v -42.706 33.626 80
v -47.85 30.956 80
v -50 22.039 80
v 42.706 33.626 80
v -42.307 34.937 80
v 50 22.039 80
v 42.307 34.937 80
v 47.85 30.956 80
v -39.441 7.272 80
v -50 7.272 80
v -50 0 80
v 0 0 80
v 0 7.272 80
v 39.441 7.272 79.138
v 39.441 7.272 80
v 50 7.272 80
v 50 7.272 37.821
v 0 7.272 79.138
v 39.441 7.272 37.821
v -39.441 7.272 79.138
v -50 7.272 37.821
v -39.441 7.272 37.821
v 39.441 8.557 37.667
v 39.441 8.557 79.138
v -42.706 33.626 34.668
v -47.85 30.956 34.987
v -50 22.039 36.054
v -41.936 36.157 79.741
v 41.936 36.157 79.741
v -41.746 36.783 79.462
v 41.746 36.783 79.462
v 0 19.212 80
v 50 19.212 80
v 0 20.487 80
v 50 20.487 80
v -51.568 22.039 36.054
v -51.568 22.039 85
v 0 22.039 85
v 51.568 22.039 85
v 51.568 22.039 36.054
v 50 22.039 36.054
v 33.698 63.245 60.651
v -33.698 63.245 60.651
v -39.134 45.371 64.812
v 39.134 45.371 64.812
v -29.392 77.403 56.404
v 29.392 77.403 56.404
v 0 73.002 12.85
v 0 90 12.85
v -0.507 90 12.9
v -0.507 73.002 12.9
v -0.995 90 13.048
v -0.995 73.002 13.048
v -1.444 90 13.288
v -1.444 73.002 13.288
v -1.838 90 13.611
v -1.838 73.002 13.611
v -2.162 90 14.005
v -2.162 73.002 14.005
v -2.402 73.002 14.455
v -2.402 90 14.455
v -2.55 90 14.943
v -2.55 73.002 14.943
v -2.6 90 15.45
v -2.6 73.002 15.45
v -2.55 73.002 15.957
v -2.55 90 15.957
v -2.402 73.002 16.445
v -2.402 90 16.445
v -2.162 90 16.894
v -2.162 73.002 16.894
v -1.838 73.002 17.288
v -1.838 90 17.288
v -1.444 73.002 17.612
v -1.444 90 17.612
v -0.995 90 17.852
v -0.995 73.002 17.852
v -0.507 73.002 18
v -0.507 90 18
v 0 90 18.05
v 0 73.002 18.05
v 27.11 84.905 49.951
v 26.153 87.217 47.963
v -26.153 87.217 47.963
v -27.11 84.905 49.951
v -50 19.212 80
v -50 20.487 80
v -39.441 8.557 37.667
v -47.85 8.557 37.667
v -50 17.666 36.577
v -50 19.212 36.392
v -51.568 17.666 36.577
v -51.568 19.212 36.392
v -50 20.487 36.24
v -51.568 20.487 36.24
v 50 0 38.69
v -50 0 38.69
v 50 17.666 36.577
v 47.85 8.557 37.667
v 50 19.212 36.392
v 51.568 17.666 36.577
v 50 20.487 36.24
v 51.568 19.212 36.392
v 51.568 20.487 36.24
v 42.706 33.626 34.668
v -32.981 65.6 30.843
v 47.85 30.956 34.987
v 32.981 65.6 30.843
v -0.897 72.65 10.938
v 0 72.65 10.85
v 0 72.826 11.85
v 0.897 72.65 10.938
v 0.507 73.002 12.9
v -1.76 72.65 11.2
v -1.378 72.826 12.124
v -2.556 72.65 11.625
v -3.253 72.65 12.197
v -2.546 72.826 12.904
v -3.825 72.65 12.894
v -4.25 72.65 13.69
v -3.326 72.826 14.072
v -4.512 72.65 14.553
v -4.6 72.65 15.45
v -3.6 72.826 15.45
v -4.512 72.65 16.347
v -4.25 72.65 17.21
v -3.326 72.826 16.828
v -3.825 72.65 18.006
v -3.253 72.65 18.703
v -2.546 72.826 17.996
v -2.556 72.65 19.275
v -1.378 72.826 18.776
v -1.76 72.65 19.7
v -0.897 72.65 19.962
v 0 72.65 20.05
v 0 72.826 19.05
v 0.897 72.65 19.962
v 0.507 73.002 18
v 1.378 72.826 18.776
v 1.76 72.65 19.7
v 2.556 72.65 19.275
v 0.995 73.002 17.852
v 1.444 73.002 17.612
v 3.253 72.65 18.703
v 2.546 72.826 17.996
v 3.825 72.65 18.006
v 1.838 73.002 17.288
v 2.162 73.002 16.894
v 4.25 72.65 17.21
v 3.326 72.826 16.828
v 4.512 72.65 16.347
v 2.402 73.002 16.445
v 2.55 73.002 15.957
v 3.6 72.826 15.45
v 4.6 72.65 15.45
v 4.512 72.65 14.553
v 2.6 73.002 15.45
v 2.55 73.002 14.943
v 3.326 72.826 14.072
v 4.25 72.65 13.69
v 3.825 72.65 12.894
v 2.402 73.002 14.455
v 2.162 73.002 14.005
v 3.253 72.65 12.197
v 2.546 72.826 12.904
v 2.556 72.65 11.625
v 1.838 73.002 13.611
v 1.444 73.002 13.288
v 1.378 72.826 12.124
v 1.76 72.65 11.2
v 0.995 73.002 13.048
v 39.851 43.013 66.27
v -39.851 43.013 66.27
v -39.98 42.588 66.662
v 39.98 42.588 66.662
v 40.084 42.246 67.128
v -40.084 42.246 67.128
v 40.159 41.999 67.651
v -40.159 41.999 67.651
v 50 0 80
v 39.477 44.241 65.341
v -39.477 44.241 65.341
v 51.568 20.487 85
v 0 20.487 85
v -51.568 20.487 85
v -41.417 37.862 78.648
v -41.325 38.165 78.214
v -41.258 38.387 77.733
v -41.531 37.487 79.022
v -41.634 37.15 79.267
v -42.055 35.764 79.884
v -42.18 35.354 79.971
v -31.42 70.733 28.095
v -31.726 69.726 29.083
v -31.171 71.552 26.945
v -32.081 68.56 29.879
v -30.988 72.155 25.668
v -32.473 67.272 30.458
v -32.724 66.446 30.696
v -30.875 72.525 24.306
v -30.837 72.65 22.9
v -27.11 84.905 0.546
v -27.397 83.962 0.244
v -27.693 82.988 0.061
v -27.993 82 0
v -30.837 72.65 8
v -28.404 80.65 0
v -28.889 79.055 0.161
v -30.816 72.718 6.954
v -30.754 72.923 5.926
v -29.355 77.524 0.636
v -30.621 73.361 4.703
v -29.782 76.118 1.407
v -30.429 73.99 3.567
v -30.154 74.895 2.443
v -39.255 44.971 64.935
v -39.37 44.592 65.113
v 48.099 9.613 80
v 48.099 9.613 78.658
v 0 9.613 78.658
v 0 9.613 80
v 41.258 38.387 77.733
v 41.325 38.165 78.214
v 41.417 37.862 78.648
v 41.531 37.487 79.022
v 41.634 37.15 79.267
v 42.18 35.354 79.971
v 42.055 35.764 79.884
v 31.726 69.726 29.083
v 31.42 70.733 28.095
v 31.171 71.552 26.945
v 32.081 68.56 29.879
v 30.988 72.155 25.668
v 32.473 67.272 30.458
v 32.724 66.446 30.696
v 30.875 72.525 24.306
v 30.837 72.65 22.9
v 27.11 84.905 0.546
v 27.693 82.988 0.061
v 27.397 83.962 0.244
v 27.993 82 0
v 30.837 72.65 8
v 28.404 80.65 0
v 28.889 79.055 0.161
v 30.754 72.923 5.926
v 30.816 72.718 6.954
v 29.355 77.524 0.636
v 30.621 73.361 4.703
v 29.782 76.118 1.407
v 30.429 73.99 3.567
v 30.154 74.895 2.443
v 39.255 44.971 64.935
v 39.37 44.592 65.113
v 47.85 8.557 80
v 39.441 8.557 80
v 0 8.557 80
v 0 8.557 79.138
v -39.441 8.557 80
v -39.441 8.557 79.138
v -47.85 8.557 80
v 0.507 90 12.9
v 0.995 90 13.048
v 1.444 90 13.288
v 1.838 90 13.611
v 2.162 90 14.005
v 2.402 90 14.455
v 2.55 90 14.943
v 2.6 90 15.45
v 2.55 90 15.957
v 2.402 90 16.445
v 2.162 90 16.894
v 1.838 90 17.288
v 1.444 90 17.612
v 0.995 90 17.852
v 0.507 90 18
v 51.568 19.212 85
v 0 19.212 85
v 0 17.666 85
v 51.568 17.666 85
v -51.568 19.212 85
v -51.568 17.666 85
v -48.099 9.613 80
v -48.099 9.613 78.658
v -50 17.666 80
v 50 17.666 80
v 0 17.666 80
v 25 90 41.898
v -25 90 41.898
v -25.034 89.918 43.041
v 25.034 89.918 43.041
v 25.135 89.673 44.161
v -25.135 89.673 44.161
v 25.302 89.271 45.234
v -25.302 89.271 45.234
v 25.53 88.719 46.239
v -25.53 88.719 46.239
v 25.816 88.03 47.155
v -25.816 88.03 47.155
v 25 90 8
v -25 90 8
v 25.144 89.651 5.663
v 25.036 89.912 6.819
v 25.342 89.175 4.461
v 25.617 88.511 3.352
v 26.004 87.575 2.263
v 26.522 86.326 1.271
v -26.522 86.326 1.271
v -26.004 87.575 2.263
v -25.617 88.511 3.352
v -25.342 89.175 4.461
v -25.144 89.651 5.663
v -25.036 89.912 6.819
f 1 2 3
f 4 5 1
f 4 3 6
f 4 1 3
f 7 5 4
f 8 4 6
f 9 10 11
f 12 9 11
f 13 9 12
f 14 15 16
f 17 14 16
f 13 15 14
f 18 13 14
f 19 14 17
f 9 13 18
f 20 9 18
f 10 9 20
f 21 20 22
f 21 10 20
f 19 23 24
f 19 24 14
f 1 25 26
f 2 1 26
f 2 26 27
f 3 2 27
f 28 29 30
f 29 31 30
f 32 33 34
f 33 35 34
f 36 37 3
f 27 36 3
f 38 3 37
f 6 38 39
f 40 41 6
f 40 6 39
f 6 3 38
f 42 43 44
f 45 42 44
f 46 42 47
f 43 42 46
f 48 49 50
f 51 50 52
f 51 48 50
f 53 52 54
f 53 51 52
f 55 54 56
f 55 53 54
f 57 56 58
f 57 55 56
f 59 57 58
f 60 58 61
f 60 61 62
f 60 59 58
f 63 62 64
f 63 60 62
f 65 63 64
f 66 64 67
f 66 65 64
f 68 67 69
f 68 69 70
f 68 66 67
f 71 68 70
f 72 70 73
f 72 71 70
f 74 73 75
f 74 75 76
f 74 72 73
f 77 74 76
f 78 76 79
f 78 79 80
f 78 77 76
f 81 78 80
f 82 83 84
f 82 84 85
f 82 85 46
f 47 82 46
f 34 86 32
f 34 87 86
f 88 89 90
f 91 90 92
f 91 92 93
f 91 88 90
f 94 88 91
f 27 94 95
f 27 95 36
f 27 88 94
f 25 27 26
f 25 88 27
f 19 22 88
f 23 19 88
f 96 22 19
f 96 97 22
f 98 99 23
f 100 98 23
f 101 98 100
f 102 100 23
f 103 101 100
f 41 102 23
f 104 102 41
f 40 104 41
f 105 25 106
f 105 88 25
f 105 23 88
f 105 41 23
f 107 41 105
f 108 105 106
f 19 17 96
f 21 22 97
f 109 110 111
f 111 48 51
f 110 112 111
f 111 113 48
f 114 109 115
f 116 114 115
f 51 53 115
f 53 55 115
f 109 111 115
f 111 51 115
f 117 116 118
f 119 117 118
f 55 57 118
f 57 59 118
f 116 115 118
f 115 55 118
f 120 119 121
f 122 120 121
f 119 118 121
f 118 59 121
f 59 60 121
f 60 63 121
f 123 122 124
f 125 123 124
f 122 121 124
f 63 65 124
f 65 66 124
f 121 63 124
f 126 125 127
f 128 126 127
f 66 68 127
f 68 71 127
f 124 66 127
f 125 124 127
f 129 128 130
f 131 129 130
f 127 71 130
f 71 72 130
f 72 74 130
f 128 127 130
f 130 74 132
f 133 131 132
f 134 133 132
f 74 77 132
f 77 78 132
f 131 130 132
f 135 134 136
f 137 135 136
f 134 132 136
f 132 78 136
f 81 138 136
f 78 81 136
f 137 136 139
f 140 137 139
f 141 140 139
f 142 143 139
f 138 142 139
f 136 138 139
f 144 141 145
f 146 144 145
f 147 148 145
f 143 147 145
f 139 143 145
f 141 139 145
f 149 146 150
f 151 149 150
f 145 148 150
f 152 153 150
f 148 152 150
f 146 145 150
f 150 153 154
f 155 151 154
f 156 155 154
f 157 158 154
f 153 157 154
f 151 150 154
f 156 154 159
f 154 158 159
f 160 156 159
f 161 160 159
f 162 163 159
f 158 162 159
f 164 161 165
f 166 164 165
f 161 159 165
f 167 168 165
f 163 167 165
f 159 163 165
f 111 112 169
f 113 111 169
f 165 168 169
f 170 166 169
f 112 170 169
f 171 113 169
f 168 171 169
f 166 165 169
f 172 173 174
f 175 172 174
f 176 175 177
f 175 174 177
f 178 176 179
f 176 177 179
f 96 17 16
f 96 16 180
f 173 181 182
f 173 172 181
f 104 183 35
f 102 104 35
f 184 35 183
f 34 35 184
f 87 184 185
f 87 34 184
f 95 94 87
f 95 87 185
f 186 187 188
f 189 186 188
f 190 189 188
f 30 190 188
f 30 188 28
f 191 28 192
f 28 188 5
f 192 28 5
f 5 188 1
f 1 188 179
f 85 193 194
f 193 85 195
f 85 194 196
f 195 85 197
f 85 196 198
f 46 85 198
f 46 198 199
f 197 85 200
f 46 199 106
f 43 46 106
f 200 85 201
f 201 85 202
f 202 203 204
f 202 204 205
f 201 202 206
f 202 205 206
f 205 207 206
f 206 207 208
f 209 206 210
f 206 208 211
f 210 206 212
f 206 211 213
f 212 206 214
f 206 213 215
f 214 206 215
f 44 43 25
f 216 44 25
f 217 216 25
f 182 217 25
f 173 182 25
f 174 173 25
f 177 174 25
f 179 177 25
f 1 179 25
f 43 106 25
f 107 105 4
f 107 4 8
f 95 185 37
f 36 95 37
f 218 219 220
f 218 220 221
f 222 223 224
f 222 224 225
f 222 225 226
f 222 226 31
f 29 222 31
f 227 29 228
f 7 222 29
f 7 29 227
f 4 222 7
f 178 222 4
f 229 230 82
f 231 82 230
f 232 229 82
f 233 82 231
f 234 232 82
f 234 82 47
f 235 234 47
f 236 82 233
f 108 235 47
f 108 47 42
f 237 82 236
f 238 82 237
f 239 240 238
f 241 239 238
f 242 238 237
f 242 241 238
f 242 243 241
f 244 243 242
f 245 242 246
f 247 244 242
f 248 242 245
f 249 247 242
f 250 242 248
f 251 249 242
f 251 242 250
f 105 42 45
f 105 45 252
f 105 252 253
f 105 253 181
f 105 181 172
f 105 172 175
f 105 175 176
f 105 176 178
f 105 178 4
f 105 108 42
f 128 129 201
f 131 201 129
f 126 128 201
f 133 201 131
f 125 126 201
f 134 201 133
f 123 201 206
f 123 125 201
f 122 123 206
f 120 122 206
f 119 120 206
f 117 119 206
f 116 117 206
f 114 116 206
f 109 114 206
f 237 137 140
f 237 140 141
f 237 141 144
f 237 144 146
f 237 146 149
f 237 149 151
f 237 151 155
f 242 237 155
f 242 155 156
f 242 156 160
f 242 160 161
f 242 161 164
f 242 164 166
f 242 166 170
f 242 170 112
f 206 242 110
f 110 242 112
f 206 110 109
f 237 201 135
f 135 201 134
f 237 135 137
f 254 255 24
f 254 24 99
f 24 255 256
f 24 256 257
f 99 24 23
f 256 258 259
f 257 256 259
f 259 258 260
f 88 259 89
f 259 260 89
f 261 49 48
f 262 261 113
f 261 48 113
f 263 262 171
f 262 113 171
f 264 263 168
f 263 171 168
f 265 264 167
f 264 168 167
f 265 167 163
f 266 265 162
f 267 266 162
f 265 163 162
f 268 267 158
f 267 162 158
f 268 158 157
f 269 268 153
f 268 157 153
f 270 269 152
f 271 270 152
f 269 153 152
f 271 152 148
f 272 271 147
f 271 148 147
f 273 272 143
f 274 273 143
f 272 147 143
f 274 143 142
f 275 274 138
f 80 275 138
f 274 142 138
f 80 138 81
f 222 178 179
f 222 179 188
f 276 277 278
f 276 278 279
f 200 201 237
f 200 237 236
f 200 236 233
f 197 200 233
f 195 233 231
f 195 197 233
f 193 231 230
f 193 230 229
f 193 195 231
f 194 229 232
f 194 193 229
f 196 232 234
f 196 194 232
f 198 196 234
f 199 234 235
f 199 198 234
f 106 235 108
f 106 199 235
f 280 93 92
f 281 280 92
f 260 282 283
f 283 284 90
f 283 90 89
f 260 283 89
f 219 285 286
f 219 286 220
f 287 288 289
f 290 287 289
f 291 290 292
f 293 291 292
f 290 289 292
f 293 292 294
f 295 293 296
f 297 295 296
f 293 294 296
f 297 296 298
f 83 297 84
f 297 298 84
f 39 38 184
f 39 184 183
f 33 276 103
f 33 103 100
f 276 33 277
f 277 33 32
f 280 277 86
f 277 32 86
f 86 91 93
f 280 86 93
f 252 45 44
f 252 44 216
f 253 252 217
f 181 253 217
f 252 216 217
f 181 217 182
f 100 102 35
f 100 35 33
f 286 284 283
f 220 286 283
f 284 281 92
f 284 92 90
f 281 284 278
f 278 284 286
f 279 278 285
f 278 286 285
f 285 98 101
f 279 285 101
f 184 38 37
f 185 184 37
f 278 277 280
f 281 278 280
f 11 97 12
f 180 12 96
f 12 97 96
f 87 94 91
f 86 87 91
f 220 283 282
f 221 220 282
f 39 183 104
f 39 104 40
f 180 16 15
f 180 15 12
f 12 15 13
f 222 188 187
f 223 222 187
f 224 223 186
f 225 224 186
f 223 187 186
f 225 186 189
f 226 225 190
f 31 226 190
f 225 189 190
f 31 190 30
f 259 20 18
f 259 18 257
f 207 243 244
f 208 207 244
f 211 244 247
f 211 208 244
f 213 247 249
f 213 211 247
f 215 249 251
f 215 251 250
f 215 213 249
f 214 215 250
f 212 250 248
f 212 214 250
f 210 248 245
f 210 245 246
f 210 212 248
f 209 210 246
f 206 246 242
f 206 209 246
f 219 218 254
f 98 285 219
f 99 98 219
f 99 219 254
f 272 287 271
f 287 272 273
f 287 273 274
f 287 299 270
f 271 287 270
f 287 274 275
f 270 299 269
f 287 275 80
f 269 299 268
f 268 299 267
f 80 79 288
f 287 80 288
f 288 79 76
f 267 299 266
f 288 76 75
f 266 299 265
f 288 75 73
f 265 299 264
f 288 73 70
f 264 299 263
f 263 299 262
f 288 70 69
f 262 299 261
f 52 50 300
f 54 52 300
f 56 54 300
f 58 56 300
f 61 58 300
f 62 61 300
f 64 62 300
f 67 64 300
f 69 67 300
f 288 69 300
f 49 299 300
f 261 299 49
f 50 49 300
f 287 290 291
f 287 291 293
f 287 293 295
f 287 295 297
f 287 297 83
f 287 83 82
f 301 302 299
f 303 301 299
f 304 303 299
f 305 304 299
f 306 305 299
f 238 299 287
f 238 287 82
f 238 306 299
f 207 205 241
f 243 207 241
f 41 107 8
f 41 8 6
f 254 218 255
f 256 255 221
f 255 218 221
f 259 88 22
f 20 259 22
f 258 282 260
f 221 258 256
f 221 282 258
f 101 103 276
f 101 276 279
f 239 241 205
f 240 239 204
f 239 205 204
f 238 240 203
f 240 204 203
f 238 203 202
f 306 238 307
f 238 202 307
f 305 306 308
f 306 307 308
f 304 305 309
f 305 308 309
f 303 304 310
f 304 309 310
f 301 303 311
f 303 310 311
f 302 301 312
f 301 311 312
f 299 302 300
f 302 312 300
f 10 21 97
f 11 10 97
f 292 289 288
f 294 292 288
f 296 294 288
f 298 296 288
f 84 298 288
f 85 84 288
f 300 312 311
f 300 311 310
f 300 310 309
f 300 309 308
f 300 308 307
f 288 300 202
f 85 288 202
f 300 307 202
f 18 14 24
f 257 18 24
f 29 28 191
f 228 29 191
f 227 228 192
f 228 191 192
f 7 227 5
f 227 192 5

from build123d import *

# Parameters (mm, degrees)
BOSS_EXTRUDE2_DEPTH   = 80
CUT_EXTRUDE6_DEPTH    = 80
FILLET4_R             = 8
FILLET6_R             = 8
BOSS_EXTRUDE3_DEPTH   = 5
CUT_EXTRUDE7_DEPTH    = 53
SKETCH8_W             = 0.862104353
SKETCH8_H             = 1.284661266
CUT_EXTRUDE8_DEPTH    = 53
SKETCH9_R             = 2.6
CUT_EXTRUDE9_DEPTH    = 53
CHAMFER1_SIZE         = 2
CHAMFER1_SIZE2        = 0.352653961
CHAMFER2_SIZE         = 2
CHAMFER2_SIZE2        = 1.125418904
CHAMFER2_PART_2_SIZE  = 2
CHAMFER2_PART_2_SIZE2 = 1.486326178
CHAMFER2_PART_3_SIZE  = 2
CHAMFER2_PART_3_SIZE2 = 12.979996821
FILLET7_R             = 3


with BuildPart() as part:
    # Sketch4 → Boss-Extrude2 (new body)
    with BuildSketch(Plane.XY):
        Polygon((0, 90), (25, 90), (27.110033345, 84.90483075), (42.705570979, 33.625818377), (47.850101428, 30.956311994), (50, 22.038522927), (51.568309777, 22.038522927), (51.568309777, 20.486613591), (50, 20.486613591), (50, 19.211830923), (51.568309777, 19.211830923), (51.568309777, 17.666105021), (50, 17.666105021), (47.850101428, 8.556688769), (39.441409504, 8.556688769), (39.441409504, 7.272027503), (50, 7.272027503), (50, 0), (0, 0), align=None)
    extrude(amount=BOSS_EXTRUDE2_DEPTH)

    # Sketch5 → Cut-Extrude6 (cut)
    with BuildSketch(Plane.ZY):
        Polygon((80, 90), (45.569058945, 90), (57.70788513, 75.886568849), (65.410192712, 42.801872405), (80, 37.57441702), align=None)
        Polygon((30, 72.649548533), (0, 72.649548533), (0, 0), (38.690390773, 0), align=None)
    extrude(amount=-CUT_EXTRUDE6_DEPTH, mode=Mode.SUBTRACT)

    # Fillet4
    fillet4_edges = [part.edges().sort_by_distance(p)[0] for p in [
        (15.418622329, 72.649548533, 0),
        (15.418622329, 72.649548533, 30),
    ]]
    fillet(fillet4_edges, radius=FILLET4_R)

    # Fillet6
    fillet6_edges = [part.edges().sort_by_distance(p)[0] for p in [
        (12.5, 90, 0),
        (12.5, 90, 45.569058945),
    ]]
    fillet(fillet6_edges, radius=FILLET6_R)

    # Sketch6 → Boss-Extrude3 (add)
    with BuildSketch(Plane.XY.offset(80)):
        Polygon((51.568309777, 22.038522927), (50, 22.038522927), (0, 22.038522927), (0, 20.486613591), (50, 20.486613591), (51.568309777, 20.486613591), align=None)
        Polygon((50, 19.211830923), (0, 19.211830923), (0, 17.666105021), (50, 17.666105021), (51.568309777, 17.666105021), (51.568309777, 19.211830923), align=None)
    extrude(amount=BOSS_EXTRUDE3_DEPTH)

    # Sketch7 → Cut-Extrude7 (cut)
    with BuildSketch(Plane.ZY):
        Polygon((80, 17.666105021), (78.657986015, 9.613389648), (80, 9.613389648), align=None)
    extrude(amount=-CUT_EXTRUDE7_DEPTH, mode=Mode.SUBTRACT)

    # Sketch8 → Cut-Extrude8 (cut)
    with BuildSketch(Plane(origin=(39.441409504, 0, 0), x_dir=(0, 0, -1), z_dir=(1, 0, 0))):
        with Locations((-79.568947823, 7.914358136)):
            Rectangle(SKETCH8_W, SKETCH8_H)
    extrude(amount=-CUT_EXTRUDE8_DEPTH, mode=Mode.SUBTRACT)

    # Sketch9 → Cut-Extrude9 (cut)
    with BuildSketch(Plane.XZ.offset(-72.649548533)):
        with Locations((0, 15.44996627)):
            Circle(SKETCH9_R)
    extrude(amount=-CUT_EXTRUDE9_DEPTH, mode=Mode.SUBTRACT)

    # Chamfer1
    chamfer1_edges = [part.edges().sort_by_distance(p)[0] for p in [
        (2.6, 72.649548533, 15.44996627),
    ]]
    chamfer1_side = [part.faces().sort_by_distance(p)[0] for p in [
        (15.75727698, 72.649548533, 15.44996627),
    ]]
    chamfer(chamfer1_edges, length=CHAMFER1_SIZE, length2=CHAMFER1_SIZE2, reference=chamfer1_side[0])

    # Chamfer2
    chamfer2_edges = [part.edges().sort_by_distance(p)[0] for p in [
        (20.75233985, 37.57441702, 80),
    ]]
    chamfer2_side = [part.faces().sort_by_distance(p)[0] for p in [
        (23.38094375, 29.531291641, 80),
    ]]
    chamfer(chamfer2_edges, length=CHAMFER2_SIZE, length2=CHAMFER2_SIZE2, reference=chamfer2_side[0])

    # Chamfer2 part 2
    chamfer2_part_2_edges = [part.edges().sort_by_distance(p)[0] for p in [
        (19.957424217, 42.801872405, 65.410192712),
    ]]
    chamfer2_part_2_side = [part.faces().sort_by_distance(p)[0] for p in [
        (17.56283553, 58.548959268, 61.744180339),
    ]]
    chamfer(chamfer2_part_2_edges, length=CHAMFER2_PART_2_SIZE, length2=CHAMFER2_PART_2_SIZE2, reference=chamfer2_part_2_side[0])

    # Chamfer2 part 3
    chamfer2_part_3_edges = [part.edges().sort_by_distance(p)[0] for p in [
        (14.926383206, 75.886568849, 57.70788513),
    ]]
    chamfer2_part_3_side = [part.faces().sort_by_distance(p)[0] for p in [
        (14.071000693, 81.431316149, 52.938901387),
    ]]
    chamfer(chamfer2_part_3_edges, length=CHAMFER2_PART_3_SIZE, length2=CHAMFER2_PART_3_SIZE2, reference=chamfer2_part_3_side[0])

    # Fillet7
    fillet7_edges = [part.edges().sort_by_distance(p)[0] for p in [
        (19.661214366, 44.749781992, 64.956708159),
        (20.694615521, 37.954018761, 78.940533046),
        (20.033659992, 42.3005373, 66.809417005),
        (21.056470857, 35.57441702, 80),
    ]]
    fillet(fillet7_edges, radius=FILLET7_R)

    # Mirror2: part across plane


with BuildPart() as part_1:
    add(part.part)
    add(part.part.mirror(Plane(origin=(0, 90, 80), x_dir=(0, 0, 1), z_dir=(1, 0, 0))))


solid = part_1.part
